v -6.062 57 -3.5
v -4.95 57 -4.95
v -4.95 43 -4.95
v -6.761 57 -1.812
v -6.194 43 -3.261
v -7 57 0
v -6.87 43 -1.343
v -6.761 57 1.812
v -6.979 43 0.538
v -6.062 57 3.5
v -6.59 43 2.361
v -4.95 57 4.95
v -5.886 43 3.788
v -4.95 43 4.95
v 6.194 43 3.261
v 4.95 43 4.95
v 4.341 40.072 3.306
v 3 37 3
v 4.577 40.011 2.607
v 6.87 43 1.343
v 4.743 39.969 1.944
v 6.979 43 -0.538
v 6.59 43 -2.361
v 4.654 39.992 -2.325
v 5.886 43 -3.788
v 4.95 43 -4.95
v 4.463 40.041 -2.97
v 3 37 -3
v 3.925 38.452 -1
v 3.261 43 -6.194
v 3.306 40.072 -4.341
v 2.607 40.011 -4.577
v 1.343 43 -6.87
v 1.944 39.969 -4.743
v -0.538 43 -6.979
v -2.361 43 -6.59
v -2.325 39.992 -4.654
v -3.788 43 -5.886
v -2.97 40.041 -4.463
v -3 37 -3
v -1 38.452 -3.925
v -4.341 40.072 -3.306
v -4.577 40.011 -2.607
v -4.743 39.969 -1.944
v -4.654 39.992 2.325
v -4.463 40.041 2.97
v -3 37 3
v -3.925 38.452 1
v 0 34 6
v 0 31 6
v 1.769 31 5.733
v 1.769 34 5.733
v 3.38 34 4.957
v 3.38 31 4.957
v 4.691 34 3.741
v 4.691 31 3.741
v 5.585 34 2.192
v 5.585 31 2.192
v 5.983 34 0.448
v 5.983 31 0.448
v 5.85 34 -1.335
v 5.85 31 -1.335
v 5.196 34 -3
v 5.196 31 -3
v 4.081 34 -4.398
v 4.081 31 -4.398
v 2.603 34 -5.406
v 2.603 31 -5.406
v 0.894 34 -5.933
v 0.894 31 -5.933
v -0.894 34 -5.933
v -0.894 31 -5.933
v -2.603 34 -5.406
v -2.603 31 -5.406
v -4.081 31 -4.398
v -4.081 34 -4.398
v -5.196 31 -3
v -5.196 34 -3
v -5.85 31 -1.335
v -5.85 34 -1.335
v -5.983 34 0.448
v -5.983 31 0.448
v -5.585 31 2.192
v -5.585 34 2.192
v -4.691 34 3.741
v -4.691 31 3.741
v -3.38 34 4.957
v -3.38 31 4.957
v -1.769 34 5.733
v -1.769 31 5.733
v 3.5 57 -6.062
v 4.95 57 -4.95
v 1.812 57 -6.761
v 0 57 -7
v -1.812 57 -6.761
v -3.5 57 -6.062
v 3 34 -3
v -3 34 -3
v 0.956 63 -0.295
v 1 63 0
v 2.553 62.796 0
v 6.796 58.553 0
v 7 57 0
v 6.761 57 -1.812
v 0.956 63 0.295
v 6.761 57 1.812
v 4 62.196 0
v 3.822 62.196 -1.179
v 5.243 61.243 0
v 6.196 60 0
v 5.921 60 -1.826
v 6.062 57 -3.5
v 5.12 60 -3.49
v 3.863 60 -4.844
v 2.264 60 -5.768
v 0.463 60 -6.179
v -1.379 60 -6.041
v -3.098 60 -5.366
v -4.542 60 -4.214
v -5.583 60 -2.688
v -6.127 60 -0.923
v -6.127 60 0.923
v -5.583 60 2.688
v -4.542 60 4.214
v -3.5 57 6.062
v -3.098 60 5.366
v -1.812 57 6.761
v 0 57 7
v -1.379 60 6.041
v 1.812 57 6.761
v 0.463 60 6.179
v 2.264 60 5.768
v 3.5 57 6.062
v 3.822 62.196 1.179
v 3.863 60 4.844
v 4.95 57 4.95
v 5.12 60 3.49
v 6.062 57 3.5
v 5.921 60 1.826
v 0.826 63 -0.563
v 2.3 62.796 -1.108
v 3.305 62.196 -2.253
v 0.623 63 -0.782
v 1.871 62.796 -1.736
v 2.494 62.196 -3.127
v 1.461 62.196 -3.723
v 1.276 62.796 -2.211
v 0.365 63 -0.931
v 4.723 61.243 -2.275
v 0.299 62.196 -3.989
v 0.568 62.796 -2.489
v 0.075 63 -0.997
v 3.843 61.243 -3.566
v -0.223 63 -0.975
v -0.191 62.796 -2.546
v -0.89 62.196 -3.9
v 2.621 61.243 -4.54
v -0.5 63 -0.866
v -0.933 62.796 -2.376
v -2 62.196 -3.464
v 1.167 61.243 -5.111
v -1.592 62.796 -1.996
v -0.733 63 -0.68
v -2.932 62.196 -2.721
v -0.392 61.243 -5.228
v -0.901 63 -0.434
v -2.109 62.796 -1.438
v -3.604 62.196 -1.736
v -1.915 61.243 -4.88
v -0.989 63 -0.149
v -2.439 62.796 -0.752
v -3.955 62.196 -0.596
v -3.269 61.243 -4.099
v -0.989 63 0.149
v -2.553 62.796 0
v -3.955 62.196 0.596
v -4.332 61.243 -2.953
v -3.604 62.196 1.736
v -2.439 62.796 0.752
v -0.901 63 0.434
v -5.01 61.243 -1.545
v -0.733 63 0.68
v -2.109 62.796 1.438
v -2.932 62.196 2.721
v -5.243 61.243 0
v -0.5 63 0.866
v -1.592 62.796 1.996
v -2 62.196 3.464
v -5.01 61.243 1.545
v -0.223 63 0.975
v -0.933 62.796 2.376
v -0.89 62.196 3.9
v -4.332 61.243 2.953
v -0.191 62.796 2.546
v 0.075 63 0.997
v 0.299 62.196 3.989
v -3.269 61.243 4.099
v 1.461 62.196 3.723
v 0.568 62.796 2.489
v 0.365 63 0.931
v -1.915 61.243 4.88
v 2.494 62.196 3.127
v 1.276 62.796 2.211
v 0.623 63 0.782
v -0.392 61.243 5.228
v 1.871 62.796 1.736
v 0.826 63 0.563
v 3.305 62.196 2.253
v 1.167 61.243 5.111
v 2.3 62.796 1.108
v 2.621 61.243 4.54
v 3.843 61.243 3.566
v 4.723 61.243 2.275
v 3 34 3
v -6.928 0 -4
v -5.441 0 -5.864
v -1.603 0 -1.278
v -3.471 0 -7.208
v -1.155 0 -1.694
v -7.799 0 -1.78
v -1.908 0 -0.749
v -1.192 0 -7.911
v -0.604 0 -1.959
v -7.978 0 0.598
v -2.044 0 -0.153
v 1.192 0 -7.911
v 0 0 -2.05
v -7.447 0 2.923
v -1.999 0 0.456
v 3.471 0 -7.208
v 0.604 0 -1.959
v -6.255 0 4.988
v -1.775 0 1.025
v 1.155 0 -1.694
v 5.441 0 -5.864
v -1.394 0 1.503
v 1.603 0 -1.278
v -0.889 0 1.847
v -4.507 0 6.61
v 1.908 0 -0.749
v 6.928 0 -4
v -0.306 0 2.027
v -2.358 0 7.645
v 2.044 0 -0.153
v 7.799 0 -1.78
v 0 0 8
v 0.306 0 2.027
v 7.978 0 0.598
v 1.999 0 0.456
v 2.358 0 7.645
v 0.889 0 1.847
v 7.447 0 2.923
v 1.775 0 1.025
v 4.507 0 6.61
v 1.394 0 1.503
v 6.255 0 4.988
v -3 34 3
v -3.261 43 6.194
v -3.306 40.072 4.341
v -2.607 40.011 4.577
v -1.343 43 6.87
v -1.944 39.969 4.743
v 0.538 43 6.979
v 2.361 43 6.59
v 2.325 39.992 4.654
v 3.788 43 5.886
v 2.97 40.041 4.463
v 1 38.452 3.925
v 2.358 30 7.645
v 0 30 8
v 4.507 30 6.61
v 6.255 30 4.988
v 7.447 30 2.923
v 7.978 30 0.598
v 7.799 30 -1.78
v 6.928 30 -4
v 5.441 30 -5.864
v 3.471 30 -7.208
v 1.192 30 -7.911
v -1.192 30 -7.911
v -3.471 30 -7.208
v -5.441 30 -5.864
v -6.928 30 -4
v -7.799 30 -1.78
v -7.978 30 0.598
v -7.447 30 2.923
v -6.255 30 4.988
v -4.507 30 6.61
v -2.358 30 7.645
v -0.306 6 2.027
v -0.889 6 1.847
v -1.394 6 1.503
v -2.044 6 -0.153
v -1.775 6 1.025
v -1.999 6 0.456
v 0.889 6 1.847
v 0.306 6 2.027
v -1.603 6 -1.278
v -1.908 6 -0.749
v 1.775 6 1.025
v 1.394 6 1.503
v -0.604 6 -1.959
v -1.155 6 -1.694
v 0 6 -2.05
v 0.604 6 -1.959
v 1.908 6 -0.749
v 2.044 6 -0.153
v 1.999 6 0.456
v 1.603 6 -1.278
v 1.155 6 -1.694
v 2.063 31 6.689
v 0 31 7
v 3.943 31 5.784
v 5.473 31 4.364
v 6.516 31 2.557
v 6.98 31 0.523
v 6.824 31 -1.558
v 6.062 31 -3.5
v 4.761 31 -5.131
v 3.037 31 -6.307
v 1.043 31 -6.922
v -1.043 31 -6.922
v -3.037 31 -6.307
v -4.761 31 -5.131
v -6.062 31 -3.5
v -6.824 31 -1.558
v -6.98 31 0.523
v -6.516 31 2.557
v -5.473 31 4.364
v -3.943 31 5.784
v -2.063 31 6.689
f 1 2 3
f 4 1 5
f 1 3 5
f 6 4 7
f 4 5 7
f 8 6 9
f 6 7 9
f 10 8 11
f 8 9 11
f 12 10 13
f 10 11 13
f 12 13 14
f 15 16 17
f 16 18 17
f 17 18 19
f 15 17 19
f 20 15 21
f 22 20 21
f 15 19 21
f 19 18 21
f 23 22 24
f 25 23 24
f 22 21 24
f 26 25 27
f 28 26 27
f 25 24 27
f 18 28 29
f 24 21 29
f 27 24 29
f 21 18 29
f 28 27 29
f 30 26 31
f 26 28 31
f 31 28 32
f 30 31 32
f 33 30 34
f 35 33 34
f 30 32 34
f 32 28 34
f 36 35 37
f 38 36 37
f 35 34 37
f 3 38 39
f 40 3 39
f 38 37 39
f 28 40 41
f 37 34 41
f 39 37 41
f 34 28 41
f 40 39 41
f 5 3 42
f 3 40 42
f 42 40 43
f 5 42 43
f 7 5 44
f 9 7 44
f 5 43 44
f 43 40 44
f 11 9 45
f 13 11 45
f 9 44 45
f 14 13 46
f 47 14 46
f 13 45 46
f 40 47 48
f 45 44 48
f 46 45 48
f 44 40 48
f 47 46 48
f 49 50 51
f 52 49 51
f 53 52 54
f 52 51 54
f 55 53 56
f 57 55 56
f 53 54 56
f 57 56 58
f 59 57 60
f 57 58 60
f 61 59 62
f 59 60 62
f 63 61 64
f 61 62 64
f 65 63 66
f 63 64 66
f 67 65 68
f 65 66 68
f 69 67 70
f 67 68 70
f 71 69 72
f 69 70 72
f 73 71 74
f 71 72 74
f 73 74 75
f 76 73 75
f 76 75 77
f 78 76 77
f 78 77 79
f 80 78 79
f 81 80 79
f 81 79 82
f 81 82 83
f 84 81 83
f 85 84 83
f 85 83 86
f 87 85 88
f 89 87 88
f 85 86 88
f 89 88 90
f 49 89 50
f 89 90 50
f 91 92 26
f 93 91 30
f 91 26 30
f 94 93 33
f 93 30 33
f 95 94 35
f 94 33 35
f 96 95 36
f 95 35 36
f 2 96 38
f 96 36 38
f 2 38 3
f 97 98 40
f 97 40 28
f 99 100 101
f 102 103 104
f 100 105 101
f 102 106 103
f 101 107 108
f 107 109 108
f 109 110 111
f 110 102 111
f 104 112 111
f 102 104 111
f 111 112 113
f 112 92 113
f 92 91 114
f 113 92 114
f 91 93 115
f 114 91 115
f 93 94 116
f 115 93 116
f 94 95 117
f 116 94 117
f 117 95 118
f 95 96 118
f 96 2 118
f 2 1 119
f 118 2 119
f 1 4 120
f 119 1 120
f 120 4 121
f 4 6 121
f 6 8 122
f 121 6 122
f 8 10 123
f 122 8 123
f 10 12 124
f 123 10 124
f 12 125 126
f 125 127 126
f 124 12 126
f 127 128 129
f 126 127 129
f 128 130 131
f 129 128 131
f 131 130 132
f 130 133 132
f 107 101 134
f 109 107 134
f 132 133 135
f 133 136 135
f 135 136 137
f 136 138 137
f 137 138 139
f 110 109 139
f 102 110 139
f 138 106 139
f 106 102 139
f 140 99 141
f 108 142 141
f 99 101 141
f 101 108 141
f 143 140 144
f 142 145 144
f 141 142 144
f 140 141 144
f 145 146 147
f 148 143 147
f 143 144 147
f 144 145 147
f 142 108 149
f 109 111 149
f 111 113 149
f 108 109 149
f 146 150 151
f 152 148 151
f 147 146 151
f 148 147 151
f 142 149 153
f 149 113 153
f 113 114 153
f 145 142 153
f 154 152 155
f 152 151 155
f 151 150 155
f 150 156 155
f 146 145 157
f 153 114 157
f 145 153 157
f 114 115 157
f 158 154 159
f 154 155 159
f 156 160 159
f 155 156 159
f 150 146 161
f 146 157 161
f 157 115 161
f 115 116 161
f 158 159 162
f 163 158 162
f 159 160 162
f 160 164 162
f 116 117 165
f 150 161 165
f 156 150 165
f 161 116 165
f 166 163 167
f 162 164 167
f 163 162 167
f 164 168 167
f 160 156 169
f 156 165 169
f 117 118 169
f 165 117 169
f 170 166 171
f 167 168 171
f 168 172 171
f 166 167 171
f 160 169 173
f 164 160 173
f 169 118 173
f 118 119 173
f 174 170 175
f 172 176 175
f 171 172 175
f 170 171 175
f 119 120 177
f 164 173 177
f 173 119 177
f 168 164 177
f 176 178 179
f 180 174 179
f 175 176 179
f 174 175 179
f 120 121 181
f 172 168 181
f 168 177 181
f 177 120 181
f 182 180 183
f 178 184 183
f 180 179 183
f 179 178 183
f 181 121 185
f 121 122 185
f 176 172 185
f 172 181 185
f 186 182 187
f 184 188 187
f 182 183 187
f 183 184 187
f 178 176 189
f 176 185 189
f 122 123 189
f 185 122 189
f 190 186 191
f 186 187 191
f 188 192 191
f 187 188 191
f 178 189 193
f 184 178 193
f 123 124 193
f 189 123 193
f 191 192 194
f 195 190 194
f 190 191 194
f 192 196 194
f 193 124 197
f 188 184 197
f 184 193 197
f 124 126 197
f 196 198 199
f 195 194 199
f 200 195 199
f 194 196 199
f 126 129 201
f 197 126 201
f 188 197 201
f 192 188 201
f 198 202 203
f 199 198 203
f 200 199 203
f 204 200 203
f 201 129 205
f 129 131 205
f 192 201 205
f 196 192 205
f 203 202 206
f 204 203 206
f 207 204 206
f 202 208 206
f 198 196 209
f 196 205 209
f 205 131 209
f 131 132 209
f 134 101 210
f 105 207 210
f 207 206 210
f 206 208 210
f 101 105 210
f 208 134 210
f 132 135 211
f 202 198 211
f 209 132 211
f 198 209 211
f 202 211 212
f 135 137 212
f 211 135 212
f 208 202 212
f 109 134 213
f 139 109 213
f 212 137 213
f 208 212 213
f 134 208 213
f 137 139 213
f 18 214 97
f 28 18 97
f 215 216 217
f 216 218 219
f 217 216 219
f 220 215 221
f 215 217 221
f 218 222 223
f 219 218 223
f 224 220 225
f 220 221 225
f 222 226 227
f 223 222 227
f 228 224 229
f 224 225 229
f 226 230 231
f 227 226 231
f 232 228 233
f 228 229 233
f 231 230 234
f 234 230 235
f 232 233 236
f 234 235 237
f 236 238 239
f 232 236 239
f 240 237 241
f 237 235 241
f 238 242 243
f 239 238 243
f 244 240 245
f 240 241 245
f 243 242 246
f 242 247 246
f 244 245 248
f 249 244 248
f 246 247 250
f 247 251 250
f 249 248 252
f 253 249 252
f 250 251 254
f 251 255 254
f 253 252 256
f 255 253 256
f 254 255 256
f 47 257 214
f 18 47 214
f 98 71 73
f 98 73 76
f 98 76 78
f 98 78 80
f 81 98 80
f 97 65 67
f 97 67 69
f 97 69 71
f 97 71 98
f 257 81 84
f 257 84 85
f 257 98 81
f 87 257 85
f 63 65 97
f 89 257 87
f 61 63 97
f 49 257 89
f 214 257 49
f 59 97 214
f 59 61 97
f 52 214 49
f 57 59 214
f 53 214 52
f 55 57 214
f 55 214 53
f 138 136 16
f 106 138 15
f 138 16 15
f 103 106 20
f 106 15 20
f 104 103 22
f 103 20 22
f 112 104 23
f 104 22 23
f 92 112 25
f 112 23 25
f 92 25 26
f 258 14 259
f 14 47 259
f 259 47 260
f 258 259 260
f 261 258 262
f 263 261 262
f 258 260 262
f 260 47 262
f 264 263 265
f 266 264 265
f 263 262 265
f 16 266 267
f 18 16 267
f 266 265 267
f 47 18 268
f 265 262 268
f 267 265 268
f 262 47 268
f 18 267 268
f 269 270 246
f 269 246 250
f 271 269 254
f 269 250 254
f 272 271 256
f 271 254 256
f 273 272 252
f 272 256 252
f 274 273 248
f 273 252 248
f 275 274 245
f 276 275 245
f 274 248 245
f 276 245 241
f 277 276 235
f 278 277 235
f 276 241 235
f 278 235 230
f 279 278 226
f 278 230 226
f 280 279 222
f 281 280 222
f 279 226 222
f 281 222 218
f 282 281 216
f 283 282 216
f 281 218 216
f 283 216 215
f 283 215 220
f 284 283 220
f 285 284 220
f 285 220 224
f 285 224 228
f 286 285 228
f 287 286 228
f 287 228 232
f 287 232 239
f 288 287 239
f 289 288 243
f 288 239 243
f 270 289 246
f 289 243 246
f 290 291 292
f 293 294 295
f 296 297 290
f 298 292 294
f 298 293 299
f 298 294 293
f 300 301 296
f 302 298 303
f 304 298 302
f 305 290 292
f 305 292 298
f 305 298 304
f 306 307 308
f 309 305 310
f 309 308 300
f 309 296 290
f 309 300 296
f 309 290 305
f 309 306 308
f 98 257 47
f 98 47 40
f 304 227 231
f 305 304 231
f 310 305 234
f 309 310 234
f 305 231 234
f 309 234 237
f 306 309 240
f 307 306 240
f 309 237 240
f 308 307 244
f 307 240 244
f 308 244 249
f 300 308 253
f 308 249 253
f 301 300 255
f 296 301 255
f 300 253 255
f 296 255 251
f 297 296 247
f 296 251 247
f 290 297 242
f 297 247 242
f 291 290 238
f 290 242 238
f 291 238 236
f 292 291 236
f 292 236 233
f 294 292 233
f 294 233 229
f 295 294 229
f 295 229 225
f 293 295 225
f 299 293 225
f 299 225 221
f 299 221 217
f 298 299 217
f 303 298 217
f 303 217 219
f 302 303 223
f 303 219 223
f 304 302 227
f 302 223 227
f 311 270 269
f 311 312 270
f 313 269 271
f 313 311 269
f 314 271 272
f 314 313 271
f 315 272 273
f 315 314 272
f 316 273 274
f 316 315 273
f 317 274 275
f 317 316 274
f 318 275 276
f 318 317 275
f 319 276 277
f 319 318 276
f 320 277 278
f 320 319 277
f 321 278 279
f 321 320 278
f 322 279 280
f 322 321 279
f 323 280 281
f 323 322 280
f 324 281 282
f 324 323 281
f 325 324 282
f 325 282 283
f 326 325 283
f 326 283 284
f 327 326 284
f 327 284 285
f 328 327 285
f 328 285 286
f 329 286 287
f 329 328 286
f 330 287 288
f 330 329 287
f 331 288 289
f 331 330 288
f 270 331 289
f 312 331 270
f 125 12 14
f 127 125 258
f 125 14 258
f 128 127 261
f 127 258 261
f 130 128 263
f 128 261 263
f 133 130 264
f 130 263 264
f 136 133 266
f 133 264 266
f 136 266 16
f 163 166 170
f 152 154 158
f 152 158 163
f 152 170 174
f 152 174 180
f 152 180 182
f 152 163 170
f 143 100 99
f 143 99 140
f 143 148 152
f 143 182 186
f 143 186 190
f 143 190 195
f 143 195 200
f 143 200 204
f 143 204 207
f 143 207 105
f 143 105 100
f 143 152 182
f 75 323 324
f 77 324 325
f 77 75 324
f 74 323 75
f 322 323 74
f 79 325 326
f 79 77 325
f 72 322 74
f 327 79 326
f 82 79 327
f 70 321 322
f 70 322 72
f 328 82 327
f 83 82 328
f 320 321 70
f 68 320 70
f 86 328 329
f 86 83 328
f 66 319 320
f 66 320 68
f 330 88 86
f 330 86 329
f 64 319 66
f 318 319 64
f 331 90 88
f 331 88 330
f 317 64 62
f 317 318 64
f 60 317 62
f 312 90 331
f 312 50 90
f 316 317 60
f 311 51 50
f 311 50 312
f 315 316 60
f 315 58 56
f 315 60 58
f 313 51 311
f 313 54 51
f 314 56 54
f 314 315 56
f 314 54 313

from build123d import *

# Parameters (mm, degrees)
SKETCH1_R           = 8
BOSS_EXTRUDE1_DEPTH = 30
SKETCH2_R           = 8
BOSS_EXTRUDE2_DEPTH = 1
BOSS_EXTRUDE2_TAPER = 45
SKETCH3_R           = 6
BOSS_EXTRUDE3_DEPTH = 3
SKETCH4_W           = 6
SKETCH4_H           = 6
BOSS_EXTRUDE4_DEPTH = 3
BOSS_EXTRUDE5_DEPTH = 20
SKETCH9_R           = 2.05
CUT_EXTRUDE1_DEPTH  = 6


with BuildPart() as part:
    # Sketch1 → Boss-Extrude1 (new body)
    with BuildSketch(Plane(origin=(0, 0, 0), x_dir=(1, 0, 0), z_dir=(0, 1, 0))):
        with Locations(Location((0, 0, 0), (0, 0, 270))):
            Circle(SKETCH1_R)
    extrude(amount=BOSS_EXTRUDE1_DEPTH)

    # Sketch2 → Boss-Extrude2 (add)
    with BuildSketch(Plane(origin=(0, 30, 0), x_dir=(1, 0, 0), z_dir=(0, 1, 0))):
        with Locations(Location((0, 0, 0), (0, 0, 270))):
            Circle(SKETCH2_R)
    extrude(amount=BOSS_EXTRUDE2_DEPTH, taper=BOSS_EXTRUDE2_TAPER)

    # Sketch3 → Boss-Extrude3 (add)
    with BuildSketch(Plane(origin=(0, 31, 0), x_dir=(1, 0, 0), z_dir=(0, 1, 0))):
        with Locations(Location((0, 0, 0), (0, 0, 270))):
            Circle(SKETCH3_R)
    extrude(amount=BOSS_EXTRUDE3_DEPTH)

    # Sketch4 → Boss-Extrude4 (add)
    with BuildSketch(Plane(origin=(0, 34, 0), x_dir=(1, 0, 0), z_dir=(0, 1, 0))):
        Rectangle(SKETCH4_W, SKETCH4_H)
    extrude(amount=BOSS_EXTRUDE4_DEPTH)

    # Sketch6 for Loft1 → Loft1 section 0
    with BuildSketch(Plane(origin=(0, 43, 0), x_dir=(1, 0, 0), z_dir=(0, 1, 0))):
        with BuildLine():
            # circular arc as an exact rational Bezier (weights 1, cos(half-angle), 1)
            Bezier((4.949747468, -4.949747468), (9.899494937, 0), (4.949747468, 4.949747468), weights=[1, 0.707106781, 1])
            Bezier((4.949747468, 4.949747468), (0, 9.899494937), (-4.949747468, 4.949747468), weights=[1, 0.707106781, 1])
            Bezier((-4.949747468, 4.949747468), (-9.899494937, 0), (-4.949747468, -4.949747468), weights=[1, 0.707106781, 1])
            Bezier((-4.949747468, -4.949747468), (0, -9.899494937), (4.949747468, -4.949747468), weights=[1, 0.707106781, 1])
        make_face()
    # Sketch5 → Loft1 section 1
    with BuildSketch(Plane(origin=(0, 37, 0), x_dir=(1, 0, 0), z_dir=(0, 1, 0))):
        with BuildLine():
            Line((3, -3), (3, 3))
            Line((3, 3), (-3, 3))
            Line((-3, 3), (-3, -3))
            Line((-3, -3), (3, -3))
        make_face()
    loft()

    # Sketch7 → Boss-Extrude5 (add)
    with BuildSketch(Plane(origin=(0, 43, 0), x_dir=(1, 0, 0), z_dir=(0, 1, 0))):
        with BuildLine():
            ThreePointArc((4.949747468, -4.949747468), (7, 0), (4.949747468, 4.949747468))
            ThreePointArc((4.949747468, 4.949747468), (0, 7), (-4.949747468, 4.949747468))
            ThreePointArc((-4.949747468, 4.949747468), (-7, 0), (-4.949747468, -4.949747468))
            ThreePointArc((-4.949747468, -4.949747468), (0, -7), (4.949747468, -4.949747468))
        make_face()
    extrude(amount=BOSS_EXTRUDE5_DEPTH)

    # Fillet1: read off the stored shape, not the designer's step
    # Fillet1 outline → Fillet1 (revolve, cut)
    with BuildSketch(Plane.XY):
        with BuildLine():
            ThreePointArc((1, 63), (5.242640687, 61.242640687), (7, 57))
            Line((7, 57), (7, 63))
            Line((7, 63), (1, 63))
        make_face()
    revolve(axis=Axis((0, 0, 0), (0, 1, 0)), mode=Mode.SUBTRACT)

    # Sketch9 → Cut-Extrude1 (cut)
    with BuildSketch(Plane.XZ):
        with Locations(Location((0, 0, 0), (0, 0, 270))):
            Circle(SKETCH9_R)
    extrude(amount=-CUT_EXTRUDE1_DEPTH, mode=Mode.SUBTRACT)


solid = part.part
